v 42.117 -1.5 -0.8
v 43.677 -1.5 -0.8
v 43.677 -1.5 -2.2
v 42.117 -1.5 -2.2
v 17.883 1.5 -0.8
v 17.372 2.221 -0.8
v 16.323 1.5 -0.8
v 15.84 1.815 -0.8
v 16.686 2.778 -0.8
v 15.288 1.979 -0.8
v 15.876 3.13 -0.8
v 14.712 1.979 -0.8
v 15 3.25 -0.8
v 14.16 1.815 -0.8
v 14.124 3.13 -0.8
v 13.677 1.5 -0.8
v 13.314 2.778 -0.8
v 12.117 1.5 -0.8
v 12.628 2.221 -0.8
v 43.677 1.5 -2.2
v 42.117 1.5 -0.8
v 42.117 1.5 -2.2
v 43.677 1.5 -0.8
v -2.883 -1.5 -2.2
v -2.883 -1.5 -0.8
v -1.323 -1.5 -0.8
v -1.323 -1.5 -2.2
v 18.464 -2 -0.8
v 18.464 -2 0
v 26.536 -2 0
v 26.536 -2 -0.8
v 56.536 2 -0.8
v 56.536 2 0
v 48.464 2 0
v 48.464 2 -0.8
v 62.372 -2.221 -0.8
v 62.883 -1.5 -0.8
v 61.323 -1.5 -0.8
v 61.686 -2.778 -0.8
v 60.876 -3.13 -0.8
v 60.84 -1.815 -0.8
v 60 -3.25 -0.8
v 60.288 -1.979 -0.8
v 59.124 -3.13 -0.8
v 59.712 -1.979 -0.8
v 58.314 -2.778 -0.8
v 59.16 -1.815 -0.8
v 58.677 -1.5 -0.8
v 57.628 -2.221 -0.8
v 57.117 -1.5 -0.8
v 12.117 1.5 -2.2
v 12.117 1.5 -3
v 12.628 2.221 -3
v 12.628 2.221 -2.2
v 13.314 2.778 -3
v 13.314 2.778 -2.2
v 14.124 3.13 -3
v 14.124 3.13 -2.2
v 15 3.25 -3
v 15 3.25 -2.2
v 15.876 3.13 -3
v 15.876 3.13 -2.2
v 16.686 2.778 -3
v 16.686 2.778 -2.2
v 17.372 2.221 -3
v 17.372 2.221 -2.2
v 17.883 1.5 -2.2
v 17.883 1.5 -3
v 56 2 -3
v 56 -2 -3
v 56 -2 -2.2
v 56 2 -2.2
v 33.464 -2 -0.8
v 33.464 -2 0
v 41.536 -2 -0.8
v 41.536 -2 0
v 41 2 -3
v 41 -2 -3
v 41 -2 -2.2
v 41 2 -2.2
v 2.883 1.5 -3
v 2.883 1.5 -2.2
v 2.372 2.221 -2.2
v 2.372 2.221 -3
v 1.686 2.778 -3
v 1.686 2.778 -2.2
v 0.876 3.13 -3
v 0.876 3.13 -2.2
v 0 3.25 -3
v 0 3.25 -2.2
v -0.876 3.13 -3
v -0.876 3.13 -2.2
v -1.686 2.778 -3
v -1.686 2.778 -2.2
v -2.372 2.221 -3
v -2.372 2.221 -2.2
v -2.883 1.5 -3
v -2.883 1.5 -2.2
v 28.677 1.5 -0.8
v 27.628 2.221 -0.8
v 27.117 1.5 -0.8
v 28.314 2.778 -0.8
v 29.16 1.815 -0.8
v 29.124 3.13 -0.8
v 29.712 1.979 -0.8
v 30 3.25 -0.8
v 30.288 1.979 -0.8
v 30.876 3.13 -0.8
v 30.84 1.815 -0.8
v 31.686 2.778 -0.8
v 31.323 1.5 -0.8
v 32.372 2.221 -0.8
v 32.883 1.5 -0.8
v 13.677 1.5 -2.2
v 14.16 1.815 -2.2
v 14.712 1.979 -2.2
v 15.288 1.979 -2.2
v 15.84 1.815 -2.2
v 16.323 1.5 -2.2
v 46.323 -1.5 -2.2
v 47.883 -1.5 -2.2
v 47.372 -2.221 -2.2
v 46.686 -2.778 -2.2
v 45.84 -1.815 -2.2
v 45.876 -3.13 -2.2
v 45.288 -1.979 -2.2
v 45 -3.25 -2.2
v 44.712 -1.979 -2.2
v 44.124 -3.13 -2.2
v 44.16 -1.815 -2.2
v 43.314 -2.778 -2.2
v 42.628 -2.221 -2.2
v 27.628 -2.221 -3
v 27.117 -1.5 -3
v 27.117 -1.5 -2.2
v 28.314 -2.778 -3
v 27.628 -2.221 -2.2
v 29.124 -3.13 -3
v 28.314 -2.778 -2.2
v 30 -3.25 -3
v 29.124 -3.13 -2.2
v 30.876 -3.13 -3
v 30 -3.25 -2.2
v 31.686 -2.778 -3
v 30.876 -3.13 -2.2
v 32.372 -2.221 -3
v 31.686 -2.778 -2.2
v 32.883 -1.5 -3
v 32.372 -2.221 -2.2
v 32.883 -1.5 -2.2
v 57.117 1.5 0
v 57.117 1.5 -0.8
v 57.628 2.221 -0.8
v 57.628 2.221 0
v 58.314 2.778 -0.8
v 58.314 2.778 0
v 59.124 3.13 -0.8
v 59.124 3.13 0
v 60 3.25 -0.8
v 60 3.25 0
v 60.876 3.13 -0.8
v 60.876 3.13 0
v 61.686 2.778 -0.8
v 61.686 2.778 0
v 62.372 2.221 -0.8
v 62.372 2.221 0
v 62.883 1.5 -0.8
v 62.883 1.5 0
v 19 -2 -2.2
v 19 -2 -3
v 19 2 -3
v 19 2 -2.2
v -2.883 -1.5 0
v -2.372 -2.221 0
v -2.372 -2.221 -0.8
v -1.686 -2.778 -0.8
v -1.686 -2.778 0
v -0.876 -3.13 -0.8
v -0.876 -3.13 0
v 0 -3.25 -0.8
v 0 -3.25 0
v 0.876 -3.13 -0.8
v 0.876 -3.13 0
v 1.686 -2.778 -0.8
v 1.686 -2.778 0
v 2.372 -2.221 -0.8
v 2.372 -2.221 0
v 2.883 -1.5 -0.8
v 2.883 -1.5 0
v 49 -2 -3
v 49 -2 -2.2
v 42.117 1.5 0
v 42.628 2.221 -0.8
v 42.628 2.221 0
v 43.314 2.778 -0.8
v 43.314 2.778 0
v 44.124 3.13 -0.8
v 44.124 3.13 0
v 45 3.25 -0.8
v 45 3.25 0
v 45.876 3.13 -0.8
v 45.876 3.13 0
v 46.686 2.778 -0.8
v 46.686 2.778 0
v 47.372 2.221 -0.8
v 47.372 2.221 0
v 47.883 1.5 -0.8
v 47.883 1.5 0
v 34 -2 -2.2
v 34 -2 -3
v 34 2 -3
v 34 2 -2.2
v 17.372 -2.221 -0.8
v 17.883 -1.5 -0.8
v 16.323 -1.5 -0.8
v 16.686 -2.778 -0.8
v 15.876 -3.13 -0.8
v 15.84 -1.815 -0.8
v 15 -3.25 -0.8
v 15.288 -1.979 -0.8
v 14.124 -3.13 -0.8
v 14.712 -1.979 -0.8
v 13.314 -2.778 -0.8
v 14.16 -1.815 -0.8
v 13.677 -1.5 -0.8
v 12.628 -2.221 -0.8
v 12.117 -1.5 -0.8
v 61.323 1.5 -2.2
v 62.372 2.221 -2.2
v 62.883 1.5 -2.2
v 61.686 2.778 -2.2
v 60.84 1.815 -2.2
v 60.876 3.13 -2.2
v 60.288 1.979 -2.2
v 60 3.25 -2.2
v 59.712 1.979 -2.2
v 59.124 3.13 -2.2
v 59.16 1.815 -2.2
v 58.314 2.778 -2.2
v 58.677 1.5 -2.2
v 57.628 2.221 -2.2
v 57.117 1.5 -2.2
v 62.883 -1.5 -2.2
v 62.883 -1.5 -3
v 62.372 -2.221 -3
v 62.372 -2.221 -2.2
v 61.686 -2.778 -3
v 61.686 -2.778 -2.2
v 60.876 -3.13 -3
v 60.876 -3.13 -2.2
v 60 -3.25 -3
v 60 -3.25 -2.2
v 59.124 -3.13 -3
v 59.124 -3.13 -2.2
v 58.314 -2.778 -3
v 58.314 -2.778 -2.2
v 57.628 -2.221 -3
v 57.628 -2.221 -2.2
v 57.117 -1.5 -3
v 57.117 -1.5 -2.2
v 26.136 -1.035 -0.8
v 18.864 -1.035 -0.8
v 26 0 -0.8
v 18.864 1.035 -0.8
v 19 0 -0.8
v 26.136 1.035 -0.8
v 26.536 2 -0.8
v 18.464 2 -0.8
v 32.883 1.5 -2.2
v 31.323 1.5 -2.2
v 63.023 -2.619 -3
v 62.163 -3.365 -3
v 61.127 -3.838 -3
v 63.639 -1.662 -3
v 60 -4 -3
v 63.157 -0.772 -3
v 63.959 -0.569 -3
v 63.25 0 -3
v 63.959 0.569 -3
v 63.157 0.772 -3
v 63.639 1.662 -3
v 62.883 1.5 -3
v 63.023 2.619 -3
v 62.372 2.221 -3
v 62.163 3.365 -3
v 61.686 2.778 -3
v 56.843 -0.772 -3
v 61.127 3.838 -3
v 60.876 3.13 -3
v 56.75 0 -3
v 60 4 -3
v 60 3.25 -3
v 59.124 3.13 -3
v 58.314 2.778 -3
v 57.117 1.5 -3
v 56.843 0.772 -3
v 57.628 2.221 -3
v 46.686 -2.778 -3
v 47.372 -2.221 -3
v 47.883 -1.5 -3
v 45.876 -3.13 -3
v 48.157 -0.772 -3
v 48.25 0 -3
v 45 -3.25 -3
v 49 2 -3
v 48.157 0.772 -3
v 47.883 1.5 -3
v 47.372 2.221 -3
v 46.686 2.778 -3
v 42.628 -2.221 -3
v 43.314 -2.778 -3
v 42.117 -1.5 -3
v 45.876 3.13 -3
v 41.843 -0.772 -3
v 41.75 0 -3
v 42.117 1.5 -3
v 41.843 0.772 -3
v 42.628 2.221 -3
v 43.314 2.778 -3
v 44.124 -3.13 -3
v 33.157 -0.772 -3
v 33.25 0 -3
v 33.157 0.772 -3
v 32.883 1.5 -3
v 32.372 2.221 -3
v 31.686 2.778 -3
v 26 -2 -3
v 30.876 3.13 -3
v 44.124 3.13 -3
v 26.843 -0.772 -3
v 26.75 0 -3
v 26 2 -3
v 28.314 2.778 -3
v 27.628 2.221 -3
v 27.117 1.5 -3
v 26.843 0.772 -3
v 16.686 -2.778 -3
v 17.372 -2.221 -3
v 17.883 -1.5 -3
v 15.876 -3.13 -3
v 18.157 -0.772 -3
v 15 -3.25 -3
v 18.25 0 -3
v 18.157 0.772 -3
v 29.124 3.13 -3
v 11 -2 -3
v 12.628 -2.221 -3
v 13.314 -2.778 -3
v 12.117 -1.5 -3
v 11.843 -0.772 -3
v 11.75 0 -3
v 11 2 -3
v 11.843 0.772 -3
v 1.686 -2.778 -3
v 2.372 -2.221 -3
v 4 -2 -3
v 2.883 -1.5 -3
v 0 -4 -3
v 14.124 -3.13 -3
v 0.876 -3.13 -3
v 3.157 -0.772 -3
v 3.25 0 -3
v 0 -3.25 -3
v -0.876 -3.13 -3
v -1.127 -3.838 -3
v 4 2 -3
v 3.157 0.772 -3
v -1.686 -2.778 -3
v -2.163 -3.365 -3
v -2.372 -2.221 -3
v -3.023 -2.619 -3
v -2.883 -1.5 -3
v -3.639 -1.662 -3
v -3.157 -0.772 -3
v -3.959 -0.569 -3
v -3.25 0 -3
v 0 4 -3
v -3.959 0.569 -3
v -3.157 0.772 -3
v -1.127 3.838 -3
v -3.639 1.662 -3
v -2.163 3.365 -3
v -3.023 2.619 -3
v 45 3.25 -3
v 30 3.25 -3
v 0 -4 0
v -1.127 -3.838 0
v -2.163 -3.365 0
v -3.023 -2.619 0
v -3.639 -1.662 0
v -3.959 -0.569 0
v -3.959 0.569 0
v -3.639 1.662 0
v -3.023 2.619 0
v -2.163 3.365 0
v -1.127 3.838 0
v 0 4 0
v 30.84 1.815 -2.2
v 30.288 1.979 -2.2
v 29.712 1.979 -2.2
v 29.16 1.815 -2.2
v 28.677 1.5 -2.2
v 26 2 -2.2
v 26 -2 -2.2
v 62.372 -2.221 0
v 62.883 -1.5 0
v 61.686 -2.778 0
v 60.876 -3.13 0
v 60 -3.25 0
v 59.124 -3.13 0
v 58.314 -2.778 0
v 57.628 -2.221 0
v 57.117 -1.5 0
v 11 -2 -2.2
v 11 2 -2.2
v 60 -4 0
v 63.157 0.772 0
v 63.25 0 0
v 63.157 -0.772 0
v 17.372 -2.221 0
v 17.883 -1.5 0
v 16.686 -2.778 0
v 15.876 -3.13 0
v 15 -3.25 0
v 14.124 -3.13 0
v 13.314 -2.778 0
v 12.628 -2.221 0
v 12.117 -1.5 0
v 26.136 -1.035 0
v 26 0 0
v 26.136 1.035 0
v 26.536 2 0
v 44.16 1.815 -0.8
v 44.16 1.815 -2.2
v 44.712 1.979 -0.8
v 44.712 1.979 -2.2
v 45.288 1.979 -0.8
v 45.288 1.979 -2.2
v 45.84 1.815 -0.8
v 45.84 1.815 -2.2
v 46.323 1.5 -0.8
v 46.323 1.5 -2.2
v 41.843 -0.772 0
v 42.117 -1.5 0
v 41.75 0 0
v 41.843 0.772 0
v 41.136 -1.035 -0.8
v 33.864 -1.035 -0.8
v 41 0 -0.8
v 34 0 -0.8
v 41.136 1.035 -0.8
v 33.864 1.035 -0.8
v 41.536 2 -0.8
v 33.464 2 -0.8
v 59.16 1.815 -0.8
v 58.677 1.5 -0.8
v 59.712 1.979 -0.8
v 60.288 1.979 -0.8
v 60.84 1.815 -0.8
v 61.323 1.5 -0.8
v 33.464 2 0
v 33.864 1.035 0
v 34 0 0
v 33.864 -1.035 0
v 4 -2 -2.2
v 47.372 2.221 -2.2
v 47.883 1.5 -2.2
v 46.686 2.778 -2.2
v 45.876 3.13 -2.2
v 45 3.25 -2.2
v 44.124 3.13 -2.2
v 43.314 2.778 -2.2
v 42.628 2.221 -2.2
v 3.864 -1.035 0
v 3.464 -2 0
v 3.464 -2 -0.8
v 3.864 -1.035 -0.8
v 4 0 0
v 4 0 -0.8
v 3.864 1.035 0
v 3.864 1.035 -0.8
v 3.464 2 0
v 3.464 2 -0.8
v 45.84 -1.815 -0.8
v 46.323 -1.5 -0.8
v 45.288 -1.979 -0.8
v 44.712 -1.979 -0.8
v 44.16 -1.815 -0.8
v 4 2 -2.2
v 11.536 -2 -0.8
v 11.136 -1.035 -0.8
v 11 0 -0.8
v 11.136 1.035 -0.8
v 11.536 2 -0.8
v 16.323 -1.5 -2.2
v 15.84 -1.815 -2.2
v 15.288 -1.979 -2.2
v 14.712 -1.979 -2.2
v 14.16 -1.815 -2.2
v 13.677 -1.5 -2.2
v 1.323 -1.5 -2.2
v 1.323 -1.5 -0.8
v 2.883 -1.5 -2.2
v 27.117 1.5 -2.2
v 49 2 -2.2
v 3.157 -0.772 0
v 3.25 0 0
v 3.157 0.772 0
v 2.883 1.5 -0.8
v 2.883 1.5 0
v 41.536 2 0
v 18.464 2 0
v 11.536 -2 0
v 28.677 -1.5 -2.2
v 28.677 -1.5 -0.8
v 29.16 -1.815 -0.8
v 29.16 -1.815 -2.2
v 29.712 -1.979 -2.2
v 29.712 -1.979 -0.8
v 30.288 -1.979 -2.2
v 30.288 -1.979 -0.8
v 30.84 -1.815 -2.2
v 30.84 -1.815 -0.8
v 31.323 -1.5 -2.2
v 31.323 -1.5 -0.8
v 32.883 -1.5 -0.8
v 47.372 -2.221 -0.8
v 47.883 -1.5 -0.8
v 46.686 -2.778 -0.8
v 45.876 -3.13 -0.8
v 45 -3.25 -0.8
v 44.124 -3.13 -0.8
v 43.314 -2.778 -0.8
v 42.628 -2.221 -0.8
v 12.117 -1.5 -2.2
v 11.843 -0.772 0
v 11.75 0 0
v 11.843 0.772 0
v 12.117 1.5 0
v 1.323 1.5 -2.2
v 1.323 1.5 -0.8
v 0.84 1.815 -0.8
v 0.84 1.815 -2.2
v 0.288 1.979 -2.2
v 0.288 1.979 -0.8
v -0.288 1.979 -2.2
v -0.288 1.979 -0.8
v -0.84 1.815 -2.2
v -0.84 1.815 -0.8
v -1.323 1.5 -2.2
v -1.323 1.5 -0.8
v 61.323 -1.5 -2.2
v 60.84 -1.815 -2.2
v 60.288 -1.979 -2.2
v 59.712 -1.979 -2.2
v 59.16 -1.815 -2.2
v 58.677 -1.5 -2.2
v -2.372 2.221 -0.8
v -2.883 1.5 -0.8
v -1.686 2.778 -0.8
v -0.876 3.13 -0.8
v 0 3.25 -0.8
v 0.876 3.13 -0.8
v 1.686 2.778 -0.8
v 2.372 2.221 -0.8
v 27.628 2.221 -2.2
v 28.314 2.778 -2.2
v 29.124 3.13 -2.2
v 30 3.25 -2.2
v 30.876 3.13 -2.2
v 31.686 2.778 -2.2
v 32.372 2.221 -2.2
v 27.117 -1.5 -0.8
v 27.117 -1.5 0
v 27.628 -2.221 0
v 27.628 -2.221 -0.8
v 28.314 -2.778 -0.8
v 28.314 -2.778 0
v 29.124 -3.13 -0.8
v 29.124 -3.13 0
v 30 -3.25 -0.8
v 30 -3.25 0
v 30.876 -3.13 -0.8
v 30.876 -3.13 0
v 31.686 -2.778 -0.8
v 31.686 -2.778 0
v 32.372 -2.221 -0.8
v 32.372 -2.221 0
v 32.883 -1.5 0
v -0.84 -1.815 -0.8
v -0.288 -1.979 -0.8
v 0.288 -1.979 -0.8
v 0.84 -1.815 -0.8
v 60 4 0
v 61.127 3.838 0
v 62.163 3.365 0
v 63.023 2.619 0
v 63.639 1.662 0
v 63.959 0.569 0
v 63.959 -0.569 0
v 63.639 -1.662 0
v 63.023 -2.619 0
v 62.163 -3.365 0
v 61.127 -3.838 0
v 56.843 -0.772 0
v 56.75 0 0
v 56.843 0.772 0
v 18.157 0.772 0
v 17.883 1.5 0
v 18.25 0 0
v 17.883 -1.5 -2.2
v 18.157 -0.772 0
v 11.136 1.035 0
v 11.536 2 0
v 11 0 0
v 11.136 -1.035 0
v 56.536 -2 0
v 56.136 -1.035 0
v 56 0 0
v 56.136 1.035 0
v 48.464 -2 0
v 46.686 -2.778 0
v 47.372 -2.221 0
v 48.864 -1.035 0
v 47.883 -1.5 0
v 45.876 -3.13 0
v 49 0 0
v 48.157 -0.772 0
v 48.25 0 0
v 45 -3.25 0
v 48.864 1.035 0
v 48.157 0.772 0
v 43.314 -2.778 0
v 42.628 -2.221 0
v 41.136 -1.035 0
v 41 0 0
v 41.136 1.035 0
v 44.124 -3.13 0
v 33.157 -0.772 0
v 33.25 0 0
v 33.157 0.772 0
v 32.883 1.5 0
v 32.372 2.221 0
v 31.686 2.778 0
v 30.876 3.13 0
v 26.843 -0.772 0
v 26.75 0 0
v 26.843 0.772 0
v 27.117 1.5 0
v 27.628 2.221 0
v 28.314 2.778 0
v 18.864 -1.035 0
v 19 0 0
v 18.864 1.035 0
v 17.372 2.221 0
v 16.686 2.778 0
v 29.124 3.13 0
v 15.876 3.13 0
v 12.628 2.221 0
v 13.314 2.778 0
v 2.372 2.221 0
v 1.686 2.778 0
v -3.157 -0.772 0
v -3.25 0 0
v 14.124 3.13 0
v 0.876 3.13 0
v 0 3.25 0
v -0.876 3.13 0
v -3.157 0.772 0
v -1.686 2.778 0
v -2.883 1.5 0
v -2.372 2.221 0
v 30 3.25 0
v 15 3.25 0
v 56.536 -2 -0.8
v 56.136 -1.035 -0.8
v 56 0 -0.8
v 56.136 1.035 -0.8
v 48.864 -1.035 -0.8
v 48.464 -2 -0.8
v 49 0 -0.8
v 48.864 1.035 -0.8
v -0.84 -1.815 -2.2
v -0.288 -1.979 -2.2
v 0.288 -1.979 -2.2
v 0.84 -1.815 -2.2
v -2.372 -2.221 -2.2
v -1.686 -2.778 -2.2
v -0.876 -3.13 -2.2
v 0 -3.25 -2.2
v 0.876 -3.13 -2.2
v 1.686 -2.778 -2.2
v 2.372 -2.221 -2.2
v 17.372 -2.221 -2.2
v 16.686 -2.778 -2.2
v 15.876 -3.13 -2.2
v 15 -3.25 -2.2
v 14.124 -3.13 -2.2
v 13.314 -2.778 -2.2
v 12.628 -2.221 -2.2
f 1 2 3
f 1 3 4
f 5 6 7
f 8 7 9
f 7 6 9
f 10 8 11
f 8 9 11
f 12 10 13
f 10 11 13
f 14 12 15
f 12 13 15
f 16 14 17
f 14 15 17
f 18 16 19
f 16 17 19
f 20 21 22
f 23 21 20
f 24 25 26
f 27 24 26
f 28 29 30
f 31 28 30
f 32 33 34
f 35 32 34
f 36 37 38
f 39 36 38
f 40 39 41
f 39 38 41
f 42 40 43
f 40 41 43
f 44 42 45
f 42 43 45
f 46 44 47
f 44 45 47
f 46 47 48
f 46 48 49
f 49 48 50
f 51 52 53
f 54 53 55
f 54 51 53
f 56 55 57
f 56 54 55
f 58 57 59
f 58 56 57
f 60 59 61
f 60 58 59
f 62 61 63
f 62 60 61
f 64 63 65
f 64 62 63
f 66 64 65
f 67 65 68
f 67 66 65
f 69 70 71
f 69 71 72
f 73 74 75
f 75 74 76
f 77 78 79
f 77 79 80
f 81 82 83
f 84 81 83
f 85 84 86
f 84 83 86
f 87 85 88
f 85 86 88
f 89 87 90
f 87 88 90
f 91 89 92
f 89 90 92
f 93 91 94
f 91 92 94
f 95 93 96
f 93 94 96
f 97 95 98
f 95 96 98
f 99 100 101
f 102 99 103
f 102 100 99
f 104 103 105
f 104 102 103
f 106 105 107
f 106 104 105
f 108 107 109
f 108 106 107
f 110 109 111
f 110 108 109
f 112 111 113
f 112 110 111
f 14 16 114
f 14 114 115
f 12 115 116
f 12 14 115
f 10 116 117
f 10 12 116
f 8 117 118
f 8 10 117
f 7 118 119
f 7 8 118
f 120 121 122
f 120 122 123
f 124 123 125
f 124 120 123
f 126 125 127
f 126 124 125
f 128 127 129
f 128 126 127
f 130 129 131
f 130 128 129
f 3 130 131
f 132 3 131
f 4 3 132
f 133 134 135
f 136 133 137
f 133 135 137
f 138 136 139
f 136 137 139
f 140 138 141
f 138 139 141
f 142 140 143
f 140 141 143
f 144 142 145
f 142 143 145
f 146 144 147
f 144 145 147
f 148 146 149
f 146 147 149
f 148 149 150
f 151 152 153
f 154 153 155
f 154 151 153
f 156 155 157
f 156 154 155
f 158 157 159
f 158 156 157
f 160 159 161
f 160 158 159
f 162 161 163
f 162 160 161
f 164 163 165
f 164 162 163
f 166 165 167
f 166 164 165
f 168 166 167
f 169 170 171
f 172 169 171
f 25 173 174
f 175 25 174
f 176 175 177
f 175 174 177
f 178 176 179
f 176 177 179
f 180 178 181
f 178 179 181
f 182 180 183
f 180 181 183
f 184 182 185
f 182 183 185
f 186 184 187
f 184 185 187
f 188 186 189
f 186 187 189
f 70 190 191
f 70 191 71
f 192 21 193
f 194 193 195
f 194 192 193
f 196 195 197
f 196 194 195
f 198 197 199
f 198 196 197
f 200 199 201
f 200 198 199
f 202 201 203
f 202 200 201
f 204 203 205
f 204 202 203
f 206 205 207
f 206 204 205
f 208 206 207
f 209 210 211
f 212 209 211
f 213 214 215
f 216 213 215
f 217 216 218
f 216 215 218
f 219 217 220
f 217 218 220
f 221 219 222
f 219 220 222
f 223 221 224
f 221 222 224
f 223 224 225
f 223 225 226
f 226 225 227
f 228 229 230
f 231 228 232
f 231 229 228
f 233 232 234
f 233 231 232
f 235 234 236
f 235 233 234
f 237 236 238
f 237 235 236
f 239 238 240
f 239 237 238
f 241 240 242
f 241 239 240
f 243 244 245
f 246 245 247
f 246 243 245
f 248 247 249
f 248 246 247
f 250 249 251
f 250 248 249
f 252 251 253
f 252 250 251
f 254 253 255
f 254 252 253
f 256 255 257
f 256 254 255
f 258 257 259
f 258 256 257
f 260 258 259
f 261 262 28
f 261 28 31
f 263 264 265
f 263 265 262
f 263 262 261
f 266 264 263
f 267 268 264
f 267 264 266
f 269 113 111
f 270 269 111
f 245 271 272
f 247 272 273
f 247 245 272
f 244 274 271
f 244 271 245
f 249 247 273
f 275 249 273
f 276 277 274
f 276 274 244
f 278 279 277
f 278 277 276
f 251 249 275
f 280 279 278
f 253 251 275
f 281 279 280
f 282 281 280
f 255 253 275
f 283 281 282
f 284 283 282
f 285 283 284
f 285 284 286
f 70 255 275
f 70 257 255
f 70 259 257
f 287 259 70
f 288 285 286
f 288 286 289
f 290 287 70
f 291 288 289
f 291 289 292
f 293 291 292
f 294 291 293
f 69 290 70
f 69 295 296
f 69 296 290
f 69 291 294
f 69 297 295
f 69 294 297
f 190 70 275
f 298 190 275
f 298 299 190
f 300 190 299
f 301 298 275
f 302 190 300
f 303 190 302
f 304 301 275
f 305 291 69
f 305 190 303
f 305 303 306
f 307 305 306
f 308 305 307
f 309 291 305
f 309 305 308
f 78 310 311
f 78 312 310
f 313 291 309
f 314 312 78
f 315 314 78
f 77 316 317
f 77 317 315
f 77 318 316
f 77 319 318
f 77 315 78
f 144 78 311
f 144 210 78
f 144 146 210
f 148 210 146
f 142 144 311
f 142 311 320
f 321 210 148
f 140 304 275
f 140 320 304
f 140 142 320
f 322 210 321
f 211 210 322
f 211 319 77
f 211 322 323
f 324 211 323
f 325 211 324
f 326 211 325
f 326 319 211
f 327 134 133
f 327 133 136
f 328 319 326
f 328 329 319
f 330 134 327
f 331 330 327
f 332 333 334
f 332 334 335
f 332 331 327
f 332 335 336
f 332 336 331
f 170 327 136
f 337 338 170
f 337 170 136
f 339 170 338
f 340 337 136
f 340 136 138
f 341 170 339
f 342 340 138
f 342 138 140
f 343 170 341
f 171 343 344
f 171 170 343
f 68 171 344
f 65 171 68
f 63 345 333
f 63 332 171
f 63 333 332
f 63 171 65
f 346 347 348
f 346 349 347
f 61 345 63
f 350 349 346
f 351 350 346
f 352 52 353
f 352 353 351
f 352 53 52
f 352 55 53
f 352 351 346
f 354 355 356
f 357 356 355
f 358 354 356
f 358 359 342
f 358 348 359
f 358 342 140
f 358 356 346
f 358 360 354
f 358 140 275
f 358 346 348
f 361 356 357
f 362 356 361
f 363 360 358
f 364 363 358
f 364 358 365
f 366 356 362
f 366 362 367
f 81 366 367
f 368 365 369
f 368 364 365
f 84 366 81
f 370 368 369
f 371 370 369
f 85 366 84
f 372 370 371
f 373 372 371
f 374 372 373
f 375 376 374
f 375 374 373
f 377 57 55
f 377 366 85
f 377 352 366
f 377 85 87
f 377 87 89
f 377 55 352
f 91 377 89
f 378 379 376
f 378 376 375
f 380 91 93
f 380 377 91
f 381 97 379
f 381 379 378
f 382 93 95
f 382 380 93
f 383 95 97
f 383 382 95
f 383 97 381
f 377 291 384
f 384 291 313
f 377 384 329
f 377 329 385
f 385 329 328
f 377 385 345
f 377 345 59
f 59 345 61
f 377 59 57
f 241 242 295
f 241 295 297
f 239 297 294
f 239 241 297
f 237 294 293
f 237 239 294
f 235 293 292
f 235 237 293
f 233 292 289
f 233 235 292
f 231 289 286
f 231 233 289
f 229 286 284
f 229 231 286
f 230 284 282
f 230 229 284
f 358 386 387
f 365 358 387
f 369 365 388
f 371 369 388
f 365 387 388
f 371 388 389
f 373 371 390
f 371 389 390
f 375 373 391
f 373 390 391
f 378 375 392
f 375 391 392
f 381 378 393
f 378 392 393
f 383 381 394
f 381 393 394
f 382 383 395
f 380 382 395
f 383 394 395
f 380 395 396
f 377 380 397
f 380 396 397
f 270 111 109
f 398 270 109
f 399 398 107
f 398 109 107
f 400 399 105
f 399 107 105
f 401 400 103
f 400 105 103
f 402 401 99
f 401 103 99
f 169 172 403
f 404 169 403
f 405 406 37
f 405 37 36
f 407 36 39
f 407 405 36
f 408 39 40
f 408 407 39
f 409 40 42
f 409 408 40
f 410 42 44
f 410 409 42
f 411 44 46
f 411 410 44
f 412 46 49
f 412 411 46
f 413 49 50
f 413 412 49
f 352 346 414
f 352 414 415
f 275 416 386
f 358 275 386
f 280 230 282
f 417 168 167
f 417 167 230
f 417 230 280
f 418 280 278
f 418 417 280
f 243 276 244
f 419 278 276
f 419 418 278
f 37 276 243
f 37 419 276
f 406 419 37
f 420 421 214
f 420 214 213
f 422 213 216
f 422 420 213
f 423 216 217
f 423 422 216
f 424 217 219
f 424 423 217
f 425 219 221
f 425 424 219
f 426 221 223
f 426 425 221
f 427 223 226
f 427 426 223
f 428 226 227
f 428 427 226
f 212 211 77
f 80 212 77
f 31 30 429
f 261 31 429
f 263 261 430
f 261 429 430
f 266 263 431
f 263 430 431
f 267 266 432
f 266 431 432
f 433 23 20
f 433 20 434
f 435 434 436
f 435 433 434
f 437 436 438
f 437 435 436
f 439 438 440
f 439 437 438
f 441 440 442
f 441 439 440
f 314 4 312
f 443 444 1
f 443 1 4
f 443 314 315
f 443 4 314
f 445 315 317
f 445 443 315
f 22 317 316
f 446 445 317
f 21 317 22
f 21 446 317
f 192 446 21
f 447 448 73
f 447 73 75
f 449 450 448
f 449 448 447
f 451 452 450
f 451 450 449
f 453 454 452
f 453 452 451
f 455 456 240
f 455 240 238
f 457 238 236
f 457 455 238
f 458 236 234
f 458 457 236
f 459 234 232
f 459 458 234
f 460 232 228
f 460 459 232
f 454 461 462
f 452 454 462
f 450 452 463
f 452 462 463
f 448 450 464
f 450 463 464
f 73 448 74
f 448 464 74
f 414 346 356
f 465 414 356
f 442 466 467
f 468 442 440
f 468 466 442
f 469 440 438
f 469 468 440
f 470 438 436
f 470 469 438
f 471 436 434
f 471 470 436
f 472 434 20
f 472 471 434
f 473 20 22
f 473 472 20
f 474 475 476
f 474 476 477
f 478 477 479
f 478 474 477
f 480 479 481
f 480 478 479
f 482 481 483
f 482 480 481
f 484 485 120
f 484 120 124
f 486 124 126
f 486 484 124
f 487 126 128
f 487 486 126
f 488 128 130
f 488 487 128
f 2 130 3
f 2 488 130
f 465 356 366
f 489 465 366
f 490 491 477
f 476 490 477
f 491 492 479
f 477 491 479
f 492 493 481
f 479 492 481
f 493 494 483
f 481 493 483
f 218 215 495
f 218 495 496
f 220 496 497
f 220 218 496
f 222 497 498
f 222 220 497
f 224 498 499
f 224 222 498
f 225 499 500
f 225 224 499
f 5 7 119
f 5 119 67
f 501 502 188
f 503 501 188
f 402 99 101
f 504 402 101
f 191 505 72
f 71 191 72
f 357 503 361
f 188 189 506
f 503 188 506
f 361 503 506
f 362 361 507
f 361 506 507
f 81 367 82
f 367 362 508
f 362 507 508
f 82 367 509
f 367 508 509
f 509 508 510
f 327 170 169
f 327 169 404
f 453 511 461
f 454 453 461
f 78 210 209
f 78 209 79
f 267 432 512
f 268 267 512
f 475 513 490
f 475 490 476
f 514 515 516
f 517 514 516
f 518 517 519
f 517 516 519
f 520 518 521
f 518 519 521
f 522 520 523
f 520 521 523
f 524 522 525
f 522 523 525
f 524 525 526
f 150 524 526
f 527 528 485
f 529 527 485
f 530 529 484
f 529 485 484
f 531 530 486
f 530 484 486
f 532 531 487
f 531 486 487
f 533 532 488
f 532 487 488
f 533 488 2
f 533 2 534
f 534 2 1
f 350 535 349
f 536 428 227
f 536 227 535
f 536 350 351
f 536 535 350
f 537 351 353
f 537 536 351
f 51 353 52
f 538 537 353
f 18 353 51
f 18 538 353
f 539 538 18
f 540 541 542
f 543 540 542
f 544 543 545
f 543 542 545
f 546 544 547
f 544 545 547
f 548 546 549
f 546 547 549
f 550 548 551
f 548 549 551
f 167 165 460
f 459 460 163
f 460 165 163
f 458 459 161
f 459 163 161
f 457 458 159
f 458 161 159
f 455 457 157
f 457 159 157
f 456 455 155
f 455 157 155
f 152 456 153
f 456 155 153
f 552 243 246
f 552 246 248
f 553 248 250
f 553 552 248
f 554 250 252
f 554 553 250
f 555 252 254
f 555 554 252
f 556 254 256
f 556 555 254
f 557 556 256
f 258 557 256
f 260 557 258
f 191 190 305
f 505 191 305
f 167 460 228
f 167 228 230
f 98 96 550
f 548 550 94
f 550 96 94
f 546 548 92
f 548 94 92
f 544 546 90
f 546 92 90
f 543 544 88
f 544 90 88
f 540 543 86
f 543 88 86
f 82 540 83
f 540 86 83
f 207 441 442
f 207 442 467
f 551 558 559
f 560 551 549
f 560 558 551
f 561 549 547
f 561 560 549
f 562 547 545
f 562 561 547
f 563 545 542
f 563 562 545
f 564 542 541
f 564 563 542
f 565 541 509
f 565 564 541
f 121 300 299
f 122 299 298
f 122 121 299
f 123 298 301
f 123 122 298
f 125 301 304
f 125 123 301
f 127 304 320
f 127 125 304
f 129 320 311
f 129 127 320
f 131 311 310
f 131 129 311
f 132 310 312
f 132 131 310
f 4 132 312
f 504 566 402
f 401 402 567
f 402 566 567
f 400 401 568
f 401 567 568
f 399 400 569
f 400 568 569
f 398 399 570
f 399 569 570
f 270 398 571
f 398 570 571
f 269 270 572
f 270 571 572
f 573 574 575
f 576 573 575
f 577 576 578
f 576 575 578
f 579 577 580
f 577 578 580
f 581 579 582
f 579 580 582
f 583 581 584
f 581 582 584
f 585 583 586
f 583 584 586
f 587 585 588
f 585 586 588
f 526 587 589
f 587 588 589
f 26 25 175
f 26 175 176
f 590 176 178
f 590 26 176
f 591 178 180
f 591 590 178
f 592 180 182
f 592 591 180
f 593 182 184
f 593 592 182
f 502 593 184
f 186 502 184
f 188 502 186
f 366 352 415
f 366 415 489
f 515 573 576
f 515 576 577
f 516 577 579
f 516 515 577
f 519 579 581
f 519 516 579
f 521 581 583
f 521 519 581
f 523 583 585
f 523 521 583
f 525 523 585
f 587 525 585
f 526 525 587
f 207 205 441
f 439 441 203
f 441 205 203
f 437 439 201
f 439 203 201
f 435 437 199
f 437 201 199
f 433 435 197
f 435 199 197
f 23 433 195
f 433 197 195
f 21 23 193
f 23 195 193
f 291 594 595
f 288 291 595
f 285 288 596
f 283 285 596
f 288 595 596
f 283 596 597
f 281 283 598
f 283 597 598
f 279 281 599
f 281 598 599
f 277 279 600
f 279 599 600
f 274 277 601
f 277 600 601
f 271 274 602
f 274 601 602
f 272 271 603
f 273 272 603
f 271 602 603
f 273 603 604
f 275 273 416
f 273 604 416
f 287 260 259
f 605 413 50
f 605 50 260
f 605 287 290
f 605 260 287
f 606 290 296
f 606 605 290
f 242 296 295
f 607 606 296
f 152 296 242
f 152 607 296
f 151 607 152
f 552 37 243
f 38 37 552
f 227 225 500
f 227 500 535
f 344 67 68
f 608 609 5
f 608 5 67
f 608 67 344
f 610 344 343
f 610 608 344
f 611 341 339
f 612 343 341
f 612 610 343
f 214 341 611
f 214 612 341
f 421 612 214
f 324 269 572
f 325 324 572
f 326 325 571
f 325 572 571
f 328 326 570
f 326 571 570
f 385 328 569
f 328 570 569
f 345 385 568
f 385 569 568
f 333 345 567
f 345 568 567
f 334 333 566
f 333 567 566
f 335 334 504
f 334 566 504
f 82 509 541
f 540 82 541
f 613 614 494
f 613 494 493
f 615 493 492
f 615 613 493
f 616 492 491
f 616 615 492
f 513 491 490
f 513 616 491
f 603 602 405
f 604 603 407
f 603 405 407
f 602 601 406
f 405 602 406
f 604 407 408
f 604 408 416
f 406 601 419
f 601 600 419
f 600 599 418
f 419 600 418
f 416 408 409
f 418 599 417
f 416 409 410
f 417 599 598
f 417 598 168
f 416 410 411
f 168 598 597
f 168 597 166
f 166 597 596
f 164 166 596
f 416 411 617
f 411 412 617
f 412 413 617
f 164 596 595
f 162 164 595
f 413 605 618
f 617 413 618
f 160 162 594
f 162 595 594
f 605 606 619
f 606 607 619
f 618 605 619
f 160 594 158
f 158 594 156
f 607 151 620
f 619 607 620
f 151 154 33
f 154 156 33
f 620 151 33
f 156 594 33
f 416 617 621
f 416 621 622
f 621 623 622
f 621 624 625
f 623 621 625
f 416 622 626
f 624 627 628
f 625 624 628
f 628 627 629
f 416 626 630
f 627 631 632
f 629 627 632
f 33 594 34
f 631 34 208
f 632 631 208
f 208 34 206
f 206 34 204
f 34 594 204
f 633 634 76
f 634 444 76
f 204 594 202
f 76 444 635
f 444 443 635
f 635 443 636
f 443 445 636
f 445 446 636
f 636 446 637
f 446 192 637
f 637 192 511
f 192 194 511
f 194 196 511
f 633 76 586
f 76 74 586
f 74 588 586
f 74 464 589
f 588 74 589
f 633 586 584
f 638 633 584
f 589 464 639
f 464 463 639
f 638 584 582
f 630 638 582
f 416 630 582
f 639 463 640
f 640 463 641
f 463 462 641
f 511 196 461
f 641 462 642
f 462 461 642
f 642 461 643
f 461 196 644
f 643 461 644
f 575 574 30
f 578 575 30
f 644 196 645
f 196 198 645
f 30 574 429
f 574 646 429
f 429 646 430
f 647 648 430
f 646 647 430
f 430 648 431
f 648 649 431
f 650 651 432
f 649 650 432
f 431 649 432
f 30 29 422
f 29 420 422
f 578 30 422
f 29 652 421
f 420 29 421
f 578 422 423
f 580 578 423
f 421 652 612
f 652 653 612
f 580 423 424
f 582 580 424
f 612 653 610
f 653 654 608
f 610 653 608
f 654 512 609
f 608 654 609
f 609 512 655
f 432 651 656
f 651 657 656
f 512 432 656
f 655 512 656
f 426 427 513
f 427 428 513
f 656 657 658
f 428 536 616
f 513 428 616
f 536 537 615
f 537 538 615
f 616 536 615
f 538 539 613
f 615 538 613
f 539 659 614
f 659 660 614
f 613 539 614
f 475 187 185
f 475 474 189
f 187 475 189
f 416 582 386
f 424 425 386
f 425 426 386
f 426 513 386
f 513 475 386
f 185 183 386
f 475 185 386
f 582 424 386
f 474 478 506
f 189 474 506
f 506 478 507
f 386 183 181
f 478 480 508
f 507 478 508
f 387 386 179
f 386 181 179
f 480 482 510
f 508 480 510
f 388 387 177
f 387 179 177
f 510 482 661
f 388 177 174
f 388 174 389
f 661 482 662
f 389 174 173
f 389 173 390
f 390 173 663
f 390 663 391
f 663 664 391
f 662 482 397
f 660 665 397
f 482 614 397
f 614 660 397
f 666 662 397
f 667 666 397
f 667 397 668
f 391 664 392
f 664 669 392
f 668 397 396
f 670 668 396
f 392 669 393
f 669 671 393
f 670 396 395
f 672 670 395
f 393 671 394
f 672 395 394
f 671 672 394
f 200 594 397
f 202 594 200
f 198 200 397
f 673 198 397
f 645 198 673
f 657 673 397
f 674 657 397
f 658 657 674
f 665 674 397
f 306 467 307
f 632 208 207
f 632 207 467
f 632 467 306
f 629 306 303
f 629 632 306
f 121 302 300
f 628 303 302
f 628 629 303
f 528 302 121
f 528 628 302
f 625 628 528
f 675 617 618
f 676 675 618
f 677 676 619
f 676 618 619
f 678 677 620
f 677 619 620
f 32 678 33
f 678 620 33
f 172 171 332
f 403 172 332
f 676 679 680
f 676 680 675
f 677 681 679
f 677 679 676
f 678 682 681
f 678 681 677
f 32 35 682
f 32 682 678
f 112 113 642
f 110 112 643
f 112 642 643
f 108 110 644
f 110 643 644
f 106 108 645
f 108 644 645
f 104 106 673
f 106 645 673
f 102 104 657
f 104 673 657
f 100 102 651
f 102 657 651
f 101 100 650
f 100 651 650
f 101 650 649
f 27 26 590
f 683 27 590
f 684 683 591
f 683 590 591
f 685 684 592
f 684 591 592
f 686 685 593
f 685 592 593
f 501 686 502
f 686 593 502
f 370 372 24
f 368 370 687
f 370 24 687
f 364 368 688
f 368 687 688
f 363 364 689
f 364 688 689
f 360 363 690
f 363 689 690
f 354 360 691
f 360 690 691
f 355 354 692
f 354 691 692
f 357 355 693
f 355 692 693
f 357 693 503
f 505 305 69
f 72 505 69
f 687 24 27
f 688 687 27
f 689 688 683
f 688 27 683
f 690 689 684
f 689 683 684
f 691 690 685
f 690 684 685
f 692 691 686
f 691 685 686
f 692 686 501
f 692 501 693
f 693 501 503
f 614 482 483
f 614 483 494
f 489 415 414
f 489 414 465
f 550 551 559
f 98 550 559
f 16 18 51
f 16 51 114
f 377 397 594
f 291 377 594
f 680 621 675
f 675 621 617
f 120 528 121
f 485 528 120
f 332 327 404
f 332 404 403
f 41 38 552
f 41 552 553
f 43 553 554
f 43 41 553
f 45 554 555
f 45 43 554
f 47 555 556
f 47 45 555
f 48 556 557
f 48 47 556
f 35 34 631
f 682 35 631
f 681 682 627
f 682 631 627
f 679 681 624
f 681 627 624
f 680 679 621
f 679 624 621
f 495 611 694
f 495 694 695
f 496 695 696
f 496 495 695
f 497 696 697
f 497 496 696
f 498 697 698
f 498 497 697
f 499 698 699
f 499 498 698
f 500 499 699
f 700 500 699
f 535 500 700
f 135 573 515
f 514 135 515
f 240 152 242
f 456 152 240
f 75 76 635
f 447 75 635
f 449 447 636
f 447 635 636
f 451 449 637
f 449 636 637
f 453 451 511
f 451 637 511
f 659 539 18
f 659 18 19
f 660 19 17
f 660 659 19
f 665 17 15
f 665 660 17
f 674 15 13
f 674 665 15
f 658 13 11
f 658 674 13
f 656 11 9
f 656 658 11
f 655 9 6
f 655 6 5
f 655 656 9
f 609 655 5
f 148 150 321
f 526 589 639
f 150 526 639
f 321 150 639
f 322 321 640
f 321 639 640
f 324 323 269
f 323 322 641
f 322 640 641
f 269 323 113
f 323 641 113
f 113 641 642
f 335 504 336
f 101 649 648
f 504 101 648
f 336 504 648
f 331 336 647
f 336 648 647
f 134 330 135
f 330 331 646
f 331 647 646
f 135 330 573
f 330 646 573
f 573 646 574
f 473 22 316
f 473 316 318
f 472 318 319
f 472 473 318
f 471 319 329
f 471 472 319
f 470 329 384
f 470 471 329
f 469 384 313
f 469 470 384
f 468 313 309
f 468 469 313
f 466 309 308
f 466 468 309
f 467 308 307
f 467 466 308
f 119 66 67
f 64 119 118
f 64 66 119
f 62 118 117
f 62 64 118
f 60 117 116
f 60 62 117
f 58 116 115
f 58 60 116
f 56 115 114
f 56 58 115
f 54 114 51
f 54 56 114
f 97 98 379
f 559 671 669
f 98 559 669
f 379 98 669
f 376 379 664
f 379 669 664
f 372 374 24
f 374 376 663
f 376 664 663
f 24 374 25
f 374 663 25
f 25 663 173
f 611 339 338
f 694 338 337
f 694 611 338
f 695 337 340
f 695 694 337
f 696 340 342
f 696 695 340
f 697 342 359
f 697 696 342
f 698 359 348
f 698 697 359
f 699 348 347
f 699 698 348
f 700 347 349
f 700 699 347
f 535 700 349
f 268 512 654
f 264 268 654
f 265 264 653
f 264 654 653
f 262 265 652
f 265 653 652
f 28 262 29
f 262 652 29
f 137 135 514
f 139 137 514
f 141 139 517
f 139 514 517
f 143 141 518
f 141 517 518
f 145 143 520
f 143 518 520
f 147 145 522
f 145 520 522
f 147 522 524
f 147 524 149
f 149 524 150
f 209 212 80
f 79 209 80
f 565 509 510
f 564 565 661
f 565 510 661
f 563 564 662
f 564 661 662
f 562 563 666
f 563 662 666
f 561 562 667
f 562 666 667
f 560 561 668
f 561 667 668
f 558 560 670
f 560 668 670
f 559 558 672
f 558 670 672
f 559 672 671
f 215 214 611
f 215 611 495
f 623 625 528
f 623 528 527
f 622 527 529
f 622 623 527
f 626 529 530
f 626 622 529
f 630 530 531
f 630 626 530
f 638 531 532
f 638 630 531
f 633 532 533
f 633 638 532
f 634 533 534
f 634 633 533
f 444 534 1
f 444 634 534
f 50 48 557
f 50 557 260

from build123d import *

# Parameters (mm, degrees)
EXTRUDE_1_DEPTH          = 3
CUT_EXTRUDE_1_REACH      = 66.195
SKETCH_3_R               = 3.25
CUT_EXTRUDE_2_DEPTH      = 0.8
CUT_EXTRUDE_START        = -2.2
SKETCH_3_2_R             = 3.25
CUT_EXTRUDE_3_DEPTH      = 0.8
CUT_EXTRUDE_4_DEPTH      = 0.8
SKETCH_5_W               = 7
SKETCH_5_H               = 4
CUT_EXTRUDE_6_DEPTH      = 0.8
MIRROR_2_COPY_1_REACH    = 66.195
MIRROR_2_COPY_2_SKETCH_R = 3.25
MIRROR_2_COPY_2_DEPTH    = 0.8
MIRROR_START             = -2.2
MIRROR_2_COPY_3_SKETCH_R = 3.25
MIRROR_2_COPY_3_DEPTH    = 0.8


with BuildPart() as part:
    # 草图1 → 凸台-拉伸1 (new body)
    with BuildSketch(Plane.XY):
        with BuildLine():
            Line((0, 4), (60, 4))
            ThreePointArc((60, 4), (64, 0), (60, -4))
            Line((60, -4), (0, -4))
            ThreePointArc((0, -4), (-4, 0), (0, 4))
        make_face()
    extrude(amount=-EXTRUDE_1_DEPTH)

    # 草图2 → 切除-拉伸1 (cut, up to next)
    with BuildSketch(Plane.XY, mode=Mode.PRIVATE) as cut_extrude_1_sk1:
        with BuildLine():
            Line((1.322875656, -1.5), (2.883140649, -1.5))
            ThreePointArc((2.883140649, -1.5), (3.25, 0), (2.883140649, 1.5))
            Line((2.883140649, 1.5), (1.322875656, 1.5))
            ThreePointArc((1.322875656, 1.5), (0, 2), (-1.322875656, 1.5))
            Line((-1.322875656, 1.5), (-2.883140649, 1.5))
            ThreePointArc((-2.883140649, 1.5), (-3.25, 0), (-2.883140649, -1.5))
            Line((-2.883140649, -1.5), (-1.322875656, -1.5))
            ThreePointArc((-1.322875656, -1.5), (0, -2), (1.322875656, -1.5))
        make_face()
    cut_extrude_1_tool1 = extrude(cut_extrude_1_sk1.sketch, amount=-CUT_EXTRUDE_1_REACH, mode=Mode.PRIVATE) & part.part
    cut_extrude_1 = cut_extrude_1_tool1.solids().sort_by_distance((0, 0, 0))[0]
    add(cut_extrude_1, mode=Mode.SUBTRACT)

    # 草图3 → 切除-拉伸2 (cut)
    with BuildSketch(Plane.XY):
        Circle(SKETCH_3_R)
    cut_extrude_2 = extrude(amount=-CUT_EXTRUDE_2_DEPTH, mode=Mode.SUBTRACT)

    # 草图3<2> → 切除-拉伸3 (cut)
    with BuildSketch(Plane.XY.offset(CUT_EXTRUDE_START)):
        Circle(SKETCH_3_2_R)
    cut_extrude_3 = extrude(amount=-CUT_EXTRUDE_3_DEPTH, mode=Mode.SUBTRACT)

    # 草图4 → 切除-拉伸4 (cut)
    with BuildSketch(Plane.XY):
        with BuildLine():
            Line((3.464101615, 2), (11.535898385, 2))
            ThreePointArc((11.535898385, 2), (11, 0), (11.535898385, -2))
            Line((11.535898385, -2), (3.464101615, -2))
            ThreePointArc((3.464101615, -2), (4, 0), (3.464101615, 2))
        make_face()
    cut_extrude_4 = extrude(amount=-CUT_EXTRUDE_4_DEPTH, mode=Mode.SUBTRACT)

    # 草图5 → 切除-拉伸6 (cut)
    with BuildSketch(Plane(origin=(0, 0, -3), x_dir=(-1, 0, 0), z_dir=(0, 0, -1))):
        with Locations((-7.5, 0)):
            Rectangle(SKETCH_5_W, SKETCH_5_H)
    cut_extrude_6 = extrude(amount=-CUT_EXTRUDE_6_DEPTH, mode=Mode.SUBTRACT)

    # 镜向1: 切除-拉伸1, 切除-拉伸2, 切除-拉伸3 across plane
    add(cut_extrude_1.mirror(Plane(origin=(7.5, 0, 0), x_dir=(0, 0, 1), z_dir=(1, 0, 0))), mode=Mode.SUBTRACT)
    add(cut_extrude_2.mirror(Plane(origin=(7.5, 0, 0), x_dir=(0, 0, 1), z_dir=(1, 0, 0))), mode=Mode.SUBTRACT)
    add(cut_extrude_3.mirror(Plane(origin=(7.5, 0, 0), x_dir=(0, 0, 1), z_dir=(1, 0, 0))), mode=Mode.SUBTRACT)

    # 镜向2: 切除-拉伸1, 切除-拉伸2, 切除-拉伸3 across plane
    add(cut_extrude_1.mirror(Plane(origin=(22.5, 0, 0), x_dir=(0, 0, 1), z_dir=(1, 0, 0))), mode=Mode.SUBTRACT)
    add(cut_extrude_2.mirror(Plane(origin=(22.5, 0, 0), x_dir=(0, 0, 1), z_dir=(1, 0, 0))), mode=Mode.SUBTRACT)
    add(cut_extrude_3.mirror(Plane(origin=(22.5, 0, 0), x_dir=(0, 0, 1), z_dir=(1, 0, 0))), mode=Mode.SUBTRACT)

    # 镜向2 copy 1 sketch → 镜向2 copy 1 (cut, up to next)
    with BuildSketch(Plane(origin=(30, 0, 0), x_dir=(1, 0, 0), z_dir=(0, 0, 1)), mode=Mode.PRIVATE) as mirror_2_copy_1_sk1:
        with BuildLine():
            Line((1.322875656, -1.5), (2.883140649, -1.5))
            ThreePointArc((2.883140649, -1.5), (3.25, 0), (2.883140649, 1.5))
            Line((2.883140649, 1.5), (1.322875656, 1.5))
            ThreePointArc((1.322875656, 1.5), (0, 2), (-1.322875656, 1.5))
            Line((-1.322875656, 1.5), (-2.883140649, 1.5))
            ThreePointArc((-2.883140649, 1.5), (-3.25, 0), (-2.883140649, -1.5))
            Line((-2.883140649, -1.5), (-1.322875656, -1.5))
            ThreePointArc((-1.322875656, -1.5), (0, -2), (1.322875656, -1.5))
        make_face()
    mirror_2_copy_1_tool1 = extrude(mirror_2_copy_1_sk1.sketch, amount=-MIRROR_2_COPY_1_REACH, mode=Mode.PRIVATE) & part.part
    add(mirror_2_copy_1_tool1.solids().sort_by_distance((30, 0, 0))[0], mode=Mode.SUBTRACT)

    # 镜向2 copy 2 sketch → 镜向2 copy 2 (cut)
    with BuildSketch(Plane(origin=(30, 0, 0), x_dir=(1, 0, 0), z_dir=(0, 0, 1))):
        Circle(MIRROR_2_COPY_2_SKETCH_R)
    extrude(amount=-MIRROR_2_COPY_2_DEPTH, mode=Mode.SUBTRACT)

    # 镜向2 copy 3 sketch → 镜向2 copy 3 (cut)
    with BuildSketch(Plane(origin=(30, 0, 0), x_dir=(1, 0, 0), z_dir=(0, 0, 1)).offset(MIRROR_START)):
        Circle(MIRROR_2_COPY_3_SKETCH_R)
    extrude(amount=-MIRROR_2_COPY_3_DEPTH, mode=Mode.SUBTRACT)

    # 镜向3: 切除-拉伸4, 切除-拉伸6 across plane
    add(cut_extrude_4.mirror(Plane(origin=(15, 0, 0), x_dir=(0, 0, 1), z_dir=(1, 0, 0))), mode=Mode.SUBTRACT)
    add(cut_extrude_6.mirror(Plane(origin=(15, 0, 0), x_dir=(0, 0, 1), z_dir=(1, 0, 0))), mode=Mode.SUBTRACT)

    # 镜向4: 切除-拉伸4, 切除-拉伸6 across plane
    add(cut_extrude_4.mirror(Plane(origin=(22.5, 0, 0), x_dir=(0, 0, 1), z_dir=(1, 0, 0))), mode=Mode.SUBTRACT)
    add(cut_extrude_6.mirror(Plane(origin=(22.5, 0, 0), x_dir=(0, 0, 1), z_dir=(1, 0, 0))), mode=Mode.SUBTRACT)

    # 镜向5: 切除-拉伸1, 切除-拉伸2, 切除-拉伸3 across plane
    add(cut_extrude_1.mirror(Plane(origin=(30, 0, 0), x_dir=(0, 0, 1), z_dir=(1, 0, 0))), mode=Mode.SUBTRACT)
    add(cut_extrude_2.mirror(Plane(origin=(30, 0, 0), x_dir=(0, 0, 1), z_dir=(1, 0, 0))), mode=Mode.SUBTRACT)
    add(cut_extrude_3.mirror(Plane(origin=(30, 0, 0), x_dir=(0, 0, 1), z_dir=(1, 0, 0))), mode=Mode.SUBTRACT)

    # 镜向6: 切除-拉伸4, 切除-拉伸6 across plane
    add(cut_extrude_4.mirror(Plane(origin=(30, 0, 0), x_dir=(0, 0, 1), z_dir=(1, 0, 0))), mode=Mode.SUBTRACT)
    add(cut_extrude_6.mirror(Plane(origin=(30, 0, 0), x_dir=(0, 0, 1), z_dir=(1, 0, 0))), mode=Mode.SUBTRACT)


solid = part.part
